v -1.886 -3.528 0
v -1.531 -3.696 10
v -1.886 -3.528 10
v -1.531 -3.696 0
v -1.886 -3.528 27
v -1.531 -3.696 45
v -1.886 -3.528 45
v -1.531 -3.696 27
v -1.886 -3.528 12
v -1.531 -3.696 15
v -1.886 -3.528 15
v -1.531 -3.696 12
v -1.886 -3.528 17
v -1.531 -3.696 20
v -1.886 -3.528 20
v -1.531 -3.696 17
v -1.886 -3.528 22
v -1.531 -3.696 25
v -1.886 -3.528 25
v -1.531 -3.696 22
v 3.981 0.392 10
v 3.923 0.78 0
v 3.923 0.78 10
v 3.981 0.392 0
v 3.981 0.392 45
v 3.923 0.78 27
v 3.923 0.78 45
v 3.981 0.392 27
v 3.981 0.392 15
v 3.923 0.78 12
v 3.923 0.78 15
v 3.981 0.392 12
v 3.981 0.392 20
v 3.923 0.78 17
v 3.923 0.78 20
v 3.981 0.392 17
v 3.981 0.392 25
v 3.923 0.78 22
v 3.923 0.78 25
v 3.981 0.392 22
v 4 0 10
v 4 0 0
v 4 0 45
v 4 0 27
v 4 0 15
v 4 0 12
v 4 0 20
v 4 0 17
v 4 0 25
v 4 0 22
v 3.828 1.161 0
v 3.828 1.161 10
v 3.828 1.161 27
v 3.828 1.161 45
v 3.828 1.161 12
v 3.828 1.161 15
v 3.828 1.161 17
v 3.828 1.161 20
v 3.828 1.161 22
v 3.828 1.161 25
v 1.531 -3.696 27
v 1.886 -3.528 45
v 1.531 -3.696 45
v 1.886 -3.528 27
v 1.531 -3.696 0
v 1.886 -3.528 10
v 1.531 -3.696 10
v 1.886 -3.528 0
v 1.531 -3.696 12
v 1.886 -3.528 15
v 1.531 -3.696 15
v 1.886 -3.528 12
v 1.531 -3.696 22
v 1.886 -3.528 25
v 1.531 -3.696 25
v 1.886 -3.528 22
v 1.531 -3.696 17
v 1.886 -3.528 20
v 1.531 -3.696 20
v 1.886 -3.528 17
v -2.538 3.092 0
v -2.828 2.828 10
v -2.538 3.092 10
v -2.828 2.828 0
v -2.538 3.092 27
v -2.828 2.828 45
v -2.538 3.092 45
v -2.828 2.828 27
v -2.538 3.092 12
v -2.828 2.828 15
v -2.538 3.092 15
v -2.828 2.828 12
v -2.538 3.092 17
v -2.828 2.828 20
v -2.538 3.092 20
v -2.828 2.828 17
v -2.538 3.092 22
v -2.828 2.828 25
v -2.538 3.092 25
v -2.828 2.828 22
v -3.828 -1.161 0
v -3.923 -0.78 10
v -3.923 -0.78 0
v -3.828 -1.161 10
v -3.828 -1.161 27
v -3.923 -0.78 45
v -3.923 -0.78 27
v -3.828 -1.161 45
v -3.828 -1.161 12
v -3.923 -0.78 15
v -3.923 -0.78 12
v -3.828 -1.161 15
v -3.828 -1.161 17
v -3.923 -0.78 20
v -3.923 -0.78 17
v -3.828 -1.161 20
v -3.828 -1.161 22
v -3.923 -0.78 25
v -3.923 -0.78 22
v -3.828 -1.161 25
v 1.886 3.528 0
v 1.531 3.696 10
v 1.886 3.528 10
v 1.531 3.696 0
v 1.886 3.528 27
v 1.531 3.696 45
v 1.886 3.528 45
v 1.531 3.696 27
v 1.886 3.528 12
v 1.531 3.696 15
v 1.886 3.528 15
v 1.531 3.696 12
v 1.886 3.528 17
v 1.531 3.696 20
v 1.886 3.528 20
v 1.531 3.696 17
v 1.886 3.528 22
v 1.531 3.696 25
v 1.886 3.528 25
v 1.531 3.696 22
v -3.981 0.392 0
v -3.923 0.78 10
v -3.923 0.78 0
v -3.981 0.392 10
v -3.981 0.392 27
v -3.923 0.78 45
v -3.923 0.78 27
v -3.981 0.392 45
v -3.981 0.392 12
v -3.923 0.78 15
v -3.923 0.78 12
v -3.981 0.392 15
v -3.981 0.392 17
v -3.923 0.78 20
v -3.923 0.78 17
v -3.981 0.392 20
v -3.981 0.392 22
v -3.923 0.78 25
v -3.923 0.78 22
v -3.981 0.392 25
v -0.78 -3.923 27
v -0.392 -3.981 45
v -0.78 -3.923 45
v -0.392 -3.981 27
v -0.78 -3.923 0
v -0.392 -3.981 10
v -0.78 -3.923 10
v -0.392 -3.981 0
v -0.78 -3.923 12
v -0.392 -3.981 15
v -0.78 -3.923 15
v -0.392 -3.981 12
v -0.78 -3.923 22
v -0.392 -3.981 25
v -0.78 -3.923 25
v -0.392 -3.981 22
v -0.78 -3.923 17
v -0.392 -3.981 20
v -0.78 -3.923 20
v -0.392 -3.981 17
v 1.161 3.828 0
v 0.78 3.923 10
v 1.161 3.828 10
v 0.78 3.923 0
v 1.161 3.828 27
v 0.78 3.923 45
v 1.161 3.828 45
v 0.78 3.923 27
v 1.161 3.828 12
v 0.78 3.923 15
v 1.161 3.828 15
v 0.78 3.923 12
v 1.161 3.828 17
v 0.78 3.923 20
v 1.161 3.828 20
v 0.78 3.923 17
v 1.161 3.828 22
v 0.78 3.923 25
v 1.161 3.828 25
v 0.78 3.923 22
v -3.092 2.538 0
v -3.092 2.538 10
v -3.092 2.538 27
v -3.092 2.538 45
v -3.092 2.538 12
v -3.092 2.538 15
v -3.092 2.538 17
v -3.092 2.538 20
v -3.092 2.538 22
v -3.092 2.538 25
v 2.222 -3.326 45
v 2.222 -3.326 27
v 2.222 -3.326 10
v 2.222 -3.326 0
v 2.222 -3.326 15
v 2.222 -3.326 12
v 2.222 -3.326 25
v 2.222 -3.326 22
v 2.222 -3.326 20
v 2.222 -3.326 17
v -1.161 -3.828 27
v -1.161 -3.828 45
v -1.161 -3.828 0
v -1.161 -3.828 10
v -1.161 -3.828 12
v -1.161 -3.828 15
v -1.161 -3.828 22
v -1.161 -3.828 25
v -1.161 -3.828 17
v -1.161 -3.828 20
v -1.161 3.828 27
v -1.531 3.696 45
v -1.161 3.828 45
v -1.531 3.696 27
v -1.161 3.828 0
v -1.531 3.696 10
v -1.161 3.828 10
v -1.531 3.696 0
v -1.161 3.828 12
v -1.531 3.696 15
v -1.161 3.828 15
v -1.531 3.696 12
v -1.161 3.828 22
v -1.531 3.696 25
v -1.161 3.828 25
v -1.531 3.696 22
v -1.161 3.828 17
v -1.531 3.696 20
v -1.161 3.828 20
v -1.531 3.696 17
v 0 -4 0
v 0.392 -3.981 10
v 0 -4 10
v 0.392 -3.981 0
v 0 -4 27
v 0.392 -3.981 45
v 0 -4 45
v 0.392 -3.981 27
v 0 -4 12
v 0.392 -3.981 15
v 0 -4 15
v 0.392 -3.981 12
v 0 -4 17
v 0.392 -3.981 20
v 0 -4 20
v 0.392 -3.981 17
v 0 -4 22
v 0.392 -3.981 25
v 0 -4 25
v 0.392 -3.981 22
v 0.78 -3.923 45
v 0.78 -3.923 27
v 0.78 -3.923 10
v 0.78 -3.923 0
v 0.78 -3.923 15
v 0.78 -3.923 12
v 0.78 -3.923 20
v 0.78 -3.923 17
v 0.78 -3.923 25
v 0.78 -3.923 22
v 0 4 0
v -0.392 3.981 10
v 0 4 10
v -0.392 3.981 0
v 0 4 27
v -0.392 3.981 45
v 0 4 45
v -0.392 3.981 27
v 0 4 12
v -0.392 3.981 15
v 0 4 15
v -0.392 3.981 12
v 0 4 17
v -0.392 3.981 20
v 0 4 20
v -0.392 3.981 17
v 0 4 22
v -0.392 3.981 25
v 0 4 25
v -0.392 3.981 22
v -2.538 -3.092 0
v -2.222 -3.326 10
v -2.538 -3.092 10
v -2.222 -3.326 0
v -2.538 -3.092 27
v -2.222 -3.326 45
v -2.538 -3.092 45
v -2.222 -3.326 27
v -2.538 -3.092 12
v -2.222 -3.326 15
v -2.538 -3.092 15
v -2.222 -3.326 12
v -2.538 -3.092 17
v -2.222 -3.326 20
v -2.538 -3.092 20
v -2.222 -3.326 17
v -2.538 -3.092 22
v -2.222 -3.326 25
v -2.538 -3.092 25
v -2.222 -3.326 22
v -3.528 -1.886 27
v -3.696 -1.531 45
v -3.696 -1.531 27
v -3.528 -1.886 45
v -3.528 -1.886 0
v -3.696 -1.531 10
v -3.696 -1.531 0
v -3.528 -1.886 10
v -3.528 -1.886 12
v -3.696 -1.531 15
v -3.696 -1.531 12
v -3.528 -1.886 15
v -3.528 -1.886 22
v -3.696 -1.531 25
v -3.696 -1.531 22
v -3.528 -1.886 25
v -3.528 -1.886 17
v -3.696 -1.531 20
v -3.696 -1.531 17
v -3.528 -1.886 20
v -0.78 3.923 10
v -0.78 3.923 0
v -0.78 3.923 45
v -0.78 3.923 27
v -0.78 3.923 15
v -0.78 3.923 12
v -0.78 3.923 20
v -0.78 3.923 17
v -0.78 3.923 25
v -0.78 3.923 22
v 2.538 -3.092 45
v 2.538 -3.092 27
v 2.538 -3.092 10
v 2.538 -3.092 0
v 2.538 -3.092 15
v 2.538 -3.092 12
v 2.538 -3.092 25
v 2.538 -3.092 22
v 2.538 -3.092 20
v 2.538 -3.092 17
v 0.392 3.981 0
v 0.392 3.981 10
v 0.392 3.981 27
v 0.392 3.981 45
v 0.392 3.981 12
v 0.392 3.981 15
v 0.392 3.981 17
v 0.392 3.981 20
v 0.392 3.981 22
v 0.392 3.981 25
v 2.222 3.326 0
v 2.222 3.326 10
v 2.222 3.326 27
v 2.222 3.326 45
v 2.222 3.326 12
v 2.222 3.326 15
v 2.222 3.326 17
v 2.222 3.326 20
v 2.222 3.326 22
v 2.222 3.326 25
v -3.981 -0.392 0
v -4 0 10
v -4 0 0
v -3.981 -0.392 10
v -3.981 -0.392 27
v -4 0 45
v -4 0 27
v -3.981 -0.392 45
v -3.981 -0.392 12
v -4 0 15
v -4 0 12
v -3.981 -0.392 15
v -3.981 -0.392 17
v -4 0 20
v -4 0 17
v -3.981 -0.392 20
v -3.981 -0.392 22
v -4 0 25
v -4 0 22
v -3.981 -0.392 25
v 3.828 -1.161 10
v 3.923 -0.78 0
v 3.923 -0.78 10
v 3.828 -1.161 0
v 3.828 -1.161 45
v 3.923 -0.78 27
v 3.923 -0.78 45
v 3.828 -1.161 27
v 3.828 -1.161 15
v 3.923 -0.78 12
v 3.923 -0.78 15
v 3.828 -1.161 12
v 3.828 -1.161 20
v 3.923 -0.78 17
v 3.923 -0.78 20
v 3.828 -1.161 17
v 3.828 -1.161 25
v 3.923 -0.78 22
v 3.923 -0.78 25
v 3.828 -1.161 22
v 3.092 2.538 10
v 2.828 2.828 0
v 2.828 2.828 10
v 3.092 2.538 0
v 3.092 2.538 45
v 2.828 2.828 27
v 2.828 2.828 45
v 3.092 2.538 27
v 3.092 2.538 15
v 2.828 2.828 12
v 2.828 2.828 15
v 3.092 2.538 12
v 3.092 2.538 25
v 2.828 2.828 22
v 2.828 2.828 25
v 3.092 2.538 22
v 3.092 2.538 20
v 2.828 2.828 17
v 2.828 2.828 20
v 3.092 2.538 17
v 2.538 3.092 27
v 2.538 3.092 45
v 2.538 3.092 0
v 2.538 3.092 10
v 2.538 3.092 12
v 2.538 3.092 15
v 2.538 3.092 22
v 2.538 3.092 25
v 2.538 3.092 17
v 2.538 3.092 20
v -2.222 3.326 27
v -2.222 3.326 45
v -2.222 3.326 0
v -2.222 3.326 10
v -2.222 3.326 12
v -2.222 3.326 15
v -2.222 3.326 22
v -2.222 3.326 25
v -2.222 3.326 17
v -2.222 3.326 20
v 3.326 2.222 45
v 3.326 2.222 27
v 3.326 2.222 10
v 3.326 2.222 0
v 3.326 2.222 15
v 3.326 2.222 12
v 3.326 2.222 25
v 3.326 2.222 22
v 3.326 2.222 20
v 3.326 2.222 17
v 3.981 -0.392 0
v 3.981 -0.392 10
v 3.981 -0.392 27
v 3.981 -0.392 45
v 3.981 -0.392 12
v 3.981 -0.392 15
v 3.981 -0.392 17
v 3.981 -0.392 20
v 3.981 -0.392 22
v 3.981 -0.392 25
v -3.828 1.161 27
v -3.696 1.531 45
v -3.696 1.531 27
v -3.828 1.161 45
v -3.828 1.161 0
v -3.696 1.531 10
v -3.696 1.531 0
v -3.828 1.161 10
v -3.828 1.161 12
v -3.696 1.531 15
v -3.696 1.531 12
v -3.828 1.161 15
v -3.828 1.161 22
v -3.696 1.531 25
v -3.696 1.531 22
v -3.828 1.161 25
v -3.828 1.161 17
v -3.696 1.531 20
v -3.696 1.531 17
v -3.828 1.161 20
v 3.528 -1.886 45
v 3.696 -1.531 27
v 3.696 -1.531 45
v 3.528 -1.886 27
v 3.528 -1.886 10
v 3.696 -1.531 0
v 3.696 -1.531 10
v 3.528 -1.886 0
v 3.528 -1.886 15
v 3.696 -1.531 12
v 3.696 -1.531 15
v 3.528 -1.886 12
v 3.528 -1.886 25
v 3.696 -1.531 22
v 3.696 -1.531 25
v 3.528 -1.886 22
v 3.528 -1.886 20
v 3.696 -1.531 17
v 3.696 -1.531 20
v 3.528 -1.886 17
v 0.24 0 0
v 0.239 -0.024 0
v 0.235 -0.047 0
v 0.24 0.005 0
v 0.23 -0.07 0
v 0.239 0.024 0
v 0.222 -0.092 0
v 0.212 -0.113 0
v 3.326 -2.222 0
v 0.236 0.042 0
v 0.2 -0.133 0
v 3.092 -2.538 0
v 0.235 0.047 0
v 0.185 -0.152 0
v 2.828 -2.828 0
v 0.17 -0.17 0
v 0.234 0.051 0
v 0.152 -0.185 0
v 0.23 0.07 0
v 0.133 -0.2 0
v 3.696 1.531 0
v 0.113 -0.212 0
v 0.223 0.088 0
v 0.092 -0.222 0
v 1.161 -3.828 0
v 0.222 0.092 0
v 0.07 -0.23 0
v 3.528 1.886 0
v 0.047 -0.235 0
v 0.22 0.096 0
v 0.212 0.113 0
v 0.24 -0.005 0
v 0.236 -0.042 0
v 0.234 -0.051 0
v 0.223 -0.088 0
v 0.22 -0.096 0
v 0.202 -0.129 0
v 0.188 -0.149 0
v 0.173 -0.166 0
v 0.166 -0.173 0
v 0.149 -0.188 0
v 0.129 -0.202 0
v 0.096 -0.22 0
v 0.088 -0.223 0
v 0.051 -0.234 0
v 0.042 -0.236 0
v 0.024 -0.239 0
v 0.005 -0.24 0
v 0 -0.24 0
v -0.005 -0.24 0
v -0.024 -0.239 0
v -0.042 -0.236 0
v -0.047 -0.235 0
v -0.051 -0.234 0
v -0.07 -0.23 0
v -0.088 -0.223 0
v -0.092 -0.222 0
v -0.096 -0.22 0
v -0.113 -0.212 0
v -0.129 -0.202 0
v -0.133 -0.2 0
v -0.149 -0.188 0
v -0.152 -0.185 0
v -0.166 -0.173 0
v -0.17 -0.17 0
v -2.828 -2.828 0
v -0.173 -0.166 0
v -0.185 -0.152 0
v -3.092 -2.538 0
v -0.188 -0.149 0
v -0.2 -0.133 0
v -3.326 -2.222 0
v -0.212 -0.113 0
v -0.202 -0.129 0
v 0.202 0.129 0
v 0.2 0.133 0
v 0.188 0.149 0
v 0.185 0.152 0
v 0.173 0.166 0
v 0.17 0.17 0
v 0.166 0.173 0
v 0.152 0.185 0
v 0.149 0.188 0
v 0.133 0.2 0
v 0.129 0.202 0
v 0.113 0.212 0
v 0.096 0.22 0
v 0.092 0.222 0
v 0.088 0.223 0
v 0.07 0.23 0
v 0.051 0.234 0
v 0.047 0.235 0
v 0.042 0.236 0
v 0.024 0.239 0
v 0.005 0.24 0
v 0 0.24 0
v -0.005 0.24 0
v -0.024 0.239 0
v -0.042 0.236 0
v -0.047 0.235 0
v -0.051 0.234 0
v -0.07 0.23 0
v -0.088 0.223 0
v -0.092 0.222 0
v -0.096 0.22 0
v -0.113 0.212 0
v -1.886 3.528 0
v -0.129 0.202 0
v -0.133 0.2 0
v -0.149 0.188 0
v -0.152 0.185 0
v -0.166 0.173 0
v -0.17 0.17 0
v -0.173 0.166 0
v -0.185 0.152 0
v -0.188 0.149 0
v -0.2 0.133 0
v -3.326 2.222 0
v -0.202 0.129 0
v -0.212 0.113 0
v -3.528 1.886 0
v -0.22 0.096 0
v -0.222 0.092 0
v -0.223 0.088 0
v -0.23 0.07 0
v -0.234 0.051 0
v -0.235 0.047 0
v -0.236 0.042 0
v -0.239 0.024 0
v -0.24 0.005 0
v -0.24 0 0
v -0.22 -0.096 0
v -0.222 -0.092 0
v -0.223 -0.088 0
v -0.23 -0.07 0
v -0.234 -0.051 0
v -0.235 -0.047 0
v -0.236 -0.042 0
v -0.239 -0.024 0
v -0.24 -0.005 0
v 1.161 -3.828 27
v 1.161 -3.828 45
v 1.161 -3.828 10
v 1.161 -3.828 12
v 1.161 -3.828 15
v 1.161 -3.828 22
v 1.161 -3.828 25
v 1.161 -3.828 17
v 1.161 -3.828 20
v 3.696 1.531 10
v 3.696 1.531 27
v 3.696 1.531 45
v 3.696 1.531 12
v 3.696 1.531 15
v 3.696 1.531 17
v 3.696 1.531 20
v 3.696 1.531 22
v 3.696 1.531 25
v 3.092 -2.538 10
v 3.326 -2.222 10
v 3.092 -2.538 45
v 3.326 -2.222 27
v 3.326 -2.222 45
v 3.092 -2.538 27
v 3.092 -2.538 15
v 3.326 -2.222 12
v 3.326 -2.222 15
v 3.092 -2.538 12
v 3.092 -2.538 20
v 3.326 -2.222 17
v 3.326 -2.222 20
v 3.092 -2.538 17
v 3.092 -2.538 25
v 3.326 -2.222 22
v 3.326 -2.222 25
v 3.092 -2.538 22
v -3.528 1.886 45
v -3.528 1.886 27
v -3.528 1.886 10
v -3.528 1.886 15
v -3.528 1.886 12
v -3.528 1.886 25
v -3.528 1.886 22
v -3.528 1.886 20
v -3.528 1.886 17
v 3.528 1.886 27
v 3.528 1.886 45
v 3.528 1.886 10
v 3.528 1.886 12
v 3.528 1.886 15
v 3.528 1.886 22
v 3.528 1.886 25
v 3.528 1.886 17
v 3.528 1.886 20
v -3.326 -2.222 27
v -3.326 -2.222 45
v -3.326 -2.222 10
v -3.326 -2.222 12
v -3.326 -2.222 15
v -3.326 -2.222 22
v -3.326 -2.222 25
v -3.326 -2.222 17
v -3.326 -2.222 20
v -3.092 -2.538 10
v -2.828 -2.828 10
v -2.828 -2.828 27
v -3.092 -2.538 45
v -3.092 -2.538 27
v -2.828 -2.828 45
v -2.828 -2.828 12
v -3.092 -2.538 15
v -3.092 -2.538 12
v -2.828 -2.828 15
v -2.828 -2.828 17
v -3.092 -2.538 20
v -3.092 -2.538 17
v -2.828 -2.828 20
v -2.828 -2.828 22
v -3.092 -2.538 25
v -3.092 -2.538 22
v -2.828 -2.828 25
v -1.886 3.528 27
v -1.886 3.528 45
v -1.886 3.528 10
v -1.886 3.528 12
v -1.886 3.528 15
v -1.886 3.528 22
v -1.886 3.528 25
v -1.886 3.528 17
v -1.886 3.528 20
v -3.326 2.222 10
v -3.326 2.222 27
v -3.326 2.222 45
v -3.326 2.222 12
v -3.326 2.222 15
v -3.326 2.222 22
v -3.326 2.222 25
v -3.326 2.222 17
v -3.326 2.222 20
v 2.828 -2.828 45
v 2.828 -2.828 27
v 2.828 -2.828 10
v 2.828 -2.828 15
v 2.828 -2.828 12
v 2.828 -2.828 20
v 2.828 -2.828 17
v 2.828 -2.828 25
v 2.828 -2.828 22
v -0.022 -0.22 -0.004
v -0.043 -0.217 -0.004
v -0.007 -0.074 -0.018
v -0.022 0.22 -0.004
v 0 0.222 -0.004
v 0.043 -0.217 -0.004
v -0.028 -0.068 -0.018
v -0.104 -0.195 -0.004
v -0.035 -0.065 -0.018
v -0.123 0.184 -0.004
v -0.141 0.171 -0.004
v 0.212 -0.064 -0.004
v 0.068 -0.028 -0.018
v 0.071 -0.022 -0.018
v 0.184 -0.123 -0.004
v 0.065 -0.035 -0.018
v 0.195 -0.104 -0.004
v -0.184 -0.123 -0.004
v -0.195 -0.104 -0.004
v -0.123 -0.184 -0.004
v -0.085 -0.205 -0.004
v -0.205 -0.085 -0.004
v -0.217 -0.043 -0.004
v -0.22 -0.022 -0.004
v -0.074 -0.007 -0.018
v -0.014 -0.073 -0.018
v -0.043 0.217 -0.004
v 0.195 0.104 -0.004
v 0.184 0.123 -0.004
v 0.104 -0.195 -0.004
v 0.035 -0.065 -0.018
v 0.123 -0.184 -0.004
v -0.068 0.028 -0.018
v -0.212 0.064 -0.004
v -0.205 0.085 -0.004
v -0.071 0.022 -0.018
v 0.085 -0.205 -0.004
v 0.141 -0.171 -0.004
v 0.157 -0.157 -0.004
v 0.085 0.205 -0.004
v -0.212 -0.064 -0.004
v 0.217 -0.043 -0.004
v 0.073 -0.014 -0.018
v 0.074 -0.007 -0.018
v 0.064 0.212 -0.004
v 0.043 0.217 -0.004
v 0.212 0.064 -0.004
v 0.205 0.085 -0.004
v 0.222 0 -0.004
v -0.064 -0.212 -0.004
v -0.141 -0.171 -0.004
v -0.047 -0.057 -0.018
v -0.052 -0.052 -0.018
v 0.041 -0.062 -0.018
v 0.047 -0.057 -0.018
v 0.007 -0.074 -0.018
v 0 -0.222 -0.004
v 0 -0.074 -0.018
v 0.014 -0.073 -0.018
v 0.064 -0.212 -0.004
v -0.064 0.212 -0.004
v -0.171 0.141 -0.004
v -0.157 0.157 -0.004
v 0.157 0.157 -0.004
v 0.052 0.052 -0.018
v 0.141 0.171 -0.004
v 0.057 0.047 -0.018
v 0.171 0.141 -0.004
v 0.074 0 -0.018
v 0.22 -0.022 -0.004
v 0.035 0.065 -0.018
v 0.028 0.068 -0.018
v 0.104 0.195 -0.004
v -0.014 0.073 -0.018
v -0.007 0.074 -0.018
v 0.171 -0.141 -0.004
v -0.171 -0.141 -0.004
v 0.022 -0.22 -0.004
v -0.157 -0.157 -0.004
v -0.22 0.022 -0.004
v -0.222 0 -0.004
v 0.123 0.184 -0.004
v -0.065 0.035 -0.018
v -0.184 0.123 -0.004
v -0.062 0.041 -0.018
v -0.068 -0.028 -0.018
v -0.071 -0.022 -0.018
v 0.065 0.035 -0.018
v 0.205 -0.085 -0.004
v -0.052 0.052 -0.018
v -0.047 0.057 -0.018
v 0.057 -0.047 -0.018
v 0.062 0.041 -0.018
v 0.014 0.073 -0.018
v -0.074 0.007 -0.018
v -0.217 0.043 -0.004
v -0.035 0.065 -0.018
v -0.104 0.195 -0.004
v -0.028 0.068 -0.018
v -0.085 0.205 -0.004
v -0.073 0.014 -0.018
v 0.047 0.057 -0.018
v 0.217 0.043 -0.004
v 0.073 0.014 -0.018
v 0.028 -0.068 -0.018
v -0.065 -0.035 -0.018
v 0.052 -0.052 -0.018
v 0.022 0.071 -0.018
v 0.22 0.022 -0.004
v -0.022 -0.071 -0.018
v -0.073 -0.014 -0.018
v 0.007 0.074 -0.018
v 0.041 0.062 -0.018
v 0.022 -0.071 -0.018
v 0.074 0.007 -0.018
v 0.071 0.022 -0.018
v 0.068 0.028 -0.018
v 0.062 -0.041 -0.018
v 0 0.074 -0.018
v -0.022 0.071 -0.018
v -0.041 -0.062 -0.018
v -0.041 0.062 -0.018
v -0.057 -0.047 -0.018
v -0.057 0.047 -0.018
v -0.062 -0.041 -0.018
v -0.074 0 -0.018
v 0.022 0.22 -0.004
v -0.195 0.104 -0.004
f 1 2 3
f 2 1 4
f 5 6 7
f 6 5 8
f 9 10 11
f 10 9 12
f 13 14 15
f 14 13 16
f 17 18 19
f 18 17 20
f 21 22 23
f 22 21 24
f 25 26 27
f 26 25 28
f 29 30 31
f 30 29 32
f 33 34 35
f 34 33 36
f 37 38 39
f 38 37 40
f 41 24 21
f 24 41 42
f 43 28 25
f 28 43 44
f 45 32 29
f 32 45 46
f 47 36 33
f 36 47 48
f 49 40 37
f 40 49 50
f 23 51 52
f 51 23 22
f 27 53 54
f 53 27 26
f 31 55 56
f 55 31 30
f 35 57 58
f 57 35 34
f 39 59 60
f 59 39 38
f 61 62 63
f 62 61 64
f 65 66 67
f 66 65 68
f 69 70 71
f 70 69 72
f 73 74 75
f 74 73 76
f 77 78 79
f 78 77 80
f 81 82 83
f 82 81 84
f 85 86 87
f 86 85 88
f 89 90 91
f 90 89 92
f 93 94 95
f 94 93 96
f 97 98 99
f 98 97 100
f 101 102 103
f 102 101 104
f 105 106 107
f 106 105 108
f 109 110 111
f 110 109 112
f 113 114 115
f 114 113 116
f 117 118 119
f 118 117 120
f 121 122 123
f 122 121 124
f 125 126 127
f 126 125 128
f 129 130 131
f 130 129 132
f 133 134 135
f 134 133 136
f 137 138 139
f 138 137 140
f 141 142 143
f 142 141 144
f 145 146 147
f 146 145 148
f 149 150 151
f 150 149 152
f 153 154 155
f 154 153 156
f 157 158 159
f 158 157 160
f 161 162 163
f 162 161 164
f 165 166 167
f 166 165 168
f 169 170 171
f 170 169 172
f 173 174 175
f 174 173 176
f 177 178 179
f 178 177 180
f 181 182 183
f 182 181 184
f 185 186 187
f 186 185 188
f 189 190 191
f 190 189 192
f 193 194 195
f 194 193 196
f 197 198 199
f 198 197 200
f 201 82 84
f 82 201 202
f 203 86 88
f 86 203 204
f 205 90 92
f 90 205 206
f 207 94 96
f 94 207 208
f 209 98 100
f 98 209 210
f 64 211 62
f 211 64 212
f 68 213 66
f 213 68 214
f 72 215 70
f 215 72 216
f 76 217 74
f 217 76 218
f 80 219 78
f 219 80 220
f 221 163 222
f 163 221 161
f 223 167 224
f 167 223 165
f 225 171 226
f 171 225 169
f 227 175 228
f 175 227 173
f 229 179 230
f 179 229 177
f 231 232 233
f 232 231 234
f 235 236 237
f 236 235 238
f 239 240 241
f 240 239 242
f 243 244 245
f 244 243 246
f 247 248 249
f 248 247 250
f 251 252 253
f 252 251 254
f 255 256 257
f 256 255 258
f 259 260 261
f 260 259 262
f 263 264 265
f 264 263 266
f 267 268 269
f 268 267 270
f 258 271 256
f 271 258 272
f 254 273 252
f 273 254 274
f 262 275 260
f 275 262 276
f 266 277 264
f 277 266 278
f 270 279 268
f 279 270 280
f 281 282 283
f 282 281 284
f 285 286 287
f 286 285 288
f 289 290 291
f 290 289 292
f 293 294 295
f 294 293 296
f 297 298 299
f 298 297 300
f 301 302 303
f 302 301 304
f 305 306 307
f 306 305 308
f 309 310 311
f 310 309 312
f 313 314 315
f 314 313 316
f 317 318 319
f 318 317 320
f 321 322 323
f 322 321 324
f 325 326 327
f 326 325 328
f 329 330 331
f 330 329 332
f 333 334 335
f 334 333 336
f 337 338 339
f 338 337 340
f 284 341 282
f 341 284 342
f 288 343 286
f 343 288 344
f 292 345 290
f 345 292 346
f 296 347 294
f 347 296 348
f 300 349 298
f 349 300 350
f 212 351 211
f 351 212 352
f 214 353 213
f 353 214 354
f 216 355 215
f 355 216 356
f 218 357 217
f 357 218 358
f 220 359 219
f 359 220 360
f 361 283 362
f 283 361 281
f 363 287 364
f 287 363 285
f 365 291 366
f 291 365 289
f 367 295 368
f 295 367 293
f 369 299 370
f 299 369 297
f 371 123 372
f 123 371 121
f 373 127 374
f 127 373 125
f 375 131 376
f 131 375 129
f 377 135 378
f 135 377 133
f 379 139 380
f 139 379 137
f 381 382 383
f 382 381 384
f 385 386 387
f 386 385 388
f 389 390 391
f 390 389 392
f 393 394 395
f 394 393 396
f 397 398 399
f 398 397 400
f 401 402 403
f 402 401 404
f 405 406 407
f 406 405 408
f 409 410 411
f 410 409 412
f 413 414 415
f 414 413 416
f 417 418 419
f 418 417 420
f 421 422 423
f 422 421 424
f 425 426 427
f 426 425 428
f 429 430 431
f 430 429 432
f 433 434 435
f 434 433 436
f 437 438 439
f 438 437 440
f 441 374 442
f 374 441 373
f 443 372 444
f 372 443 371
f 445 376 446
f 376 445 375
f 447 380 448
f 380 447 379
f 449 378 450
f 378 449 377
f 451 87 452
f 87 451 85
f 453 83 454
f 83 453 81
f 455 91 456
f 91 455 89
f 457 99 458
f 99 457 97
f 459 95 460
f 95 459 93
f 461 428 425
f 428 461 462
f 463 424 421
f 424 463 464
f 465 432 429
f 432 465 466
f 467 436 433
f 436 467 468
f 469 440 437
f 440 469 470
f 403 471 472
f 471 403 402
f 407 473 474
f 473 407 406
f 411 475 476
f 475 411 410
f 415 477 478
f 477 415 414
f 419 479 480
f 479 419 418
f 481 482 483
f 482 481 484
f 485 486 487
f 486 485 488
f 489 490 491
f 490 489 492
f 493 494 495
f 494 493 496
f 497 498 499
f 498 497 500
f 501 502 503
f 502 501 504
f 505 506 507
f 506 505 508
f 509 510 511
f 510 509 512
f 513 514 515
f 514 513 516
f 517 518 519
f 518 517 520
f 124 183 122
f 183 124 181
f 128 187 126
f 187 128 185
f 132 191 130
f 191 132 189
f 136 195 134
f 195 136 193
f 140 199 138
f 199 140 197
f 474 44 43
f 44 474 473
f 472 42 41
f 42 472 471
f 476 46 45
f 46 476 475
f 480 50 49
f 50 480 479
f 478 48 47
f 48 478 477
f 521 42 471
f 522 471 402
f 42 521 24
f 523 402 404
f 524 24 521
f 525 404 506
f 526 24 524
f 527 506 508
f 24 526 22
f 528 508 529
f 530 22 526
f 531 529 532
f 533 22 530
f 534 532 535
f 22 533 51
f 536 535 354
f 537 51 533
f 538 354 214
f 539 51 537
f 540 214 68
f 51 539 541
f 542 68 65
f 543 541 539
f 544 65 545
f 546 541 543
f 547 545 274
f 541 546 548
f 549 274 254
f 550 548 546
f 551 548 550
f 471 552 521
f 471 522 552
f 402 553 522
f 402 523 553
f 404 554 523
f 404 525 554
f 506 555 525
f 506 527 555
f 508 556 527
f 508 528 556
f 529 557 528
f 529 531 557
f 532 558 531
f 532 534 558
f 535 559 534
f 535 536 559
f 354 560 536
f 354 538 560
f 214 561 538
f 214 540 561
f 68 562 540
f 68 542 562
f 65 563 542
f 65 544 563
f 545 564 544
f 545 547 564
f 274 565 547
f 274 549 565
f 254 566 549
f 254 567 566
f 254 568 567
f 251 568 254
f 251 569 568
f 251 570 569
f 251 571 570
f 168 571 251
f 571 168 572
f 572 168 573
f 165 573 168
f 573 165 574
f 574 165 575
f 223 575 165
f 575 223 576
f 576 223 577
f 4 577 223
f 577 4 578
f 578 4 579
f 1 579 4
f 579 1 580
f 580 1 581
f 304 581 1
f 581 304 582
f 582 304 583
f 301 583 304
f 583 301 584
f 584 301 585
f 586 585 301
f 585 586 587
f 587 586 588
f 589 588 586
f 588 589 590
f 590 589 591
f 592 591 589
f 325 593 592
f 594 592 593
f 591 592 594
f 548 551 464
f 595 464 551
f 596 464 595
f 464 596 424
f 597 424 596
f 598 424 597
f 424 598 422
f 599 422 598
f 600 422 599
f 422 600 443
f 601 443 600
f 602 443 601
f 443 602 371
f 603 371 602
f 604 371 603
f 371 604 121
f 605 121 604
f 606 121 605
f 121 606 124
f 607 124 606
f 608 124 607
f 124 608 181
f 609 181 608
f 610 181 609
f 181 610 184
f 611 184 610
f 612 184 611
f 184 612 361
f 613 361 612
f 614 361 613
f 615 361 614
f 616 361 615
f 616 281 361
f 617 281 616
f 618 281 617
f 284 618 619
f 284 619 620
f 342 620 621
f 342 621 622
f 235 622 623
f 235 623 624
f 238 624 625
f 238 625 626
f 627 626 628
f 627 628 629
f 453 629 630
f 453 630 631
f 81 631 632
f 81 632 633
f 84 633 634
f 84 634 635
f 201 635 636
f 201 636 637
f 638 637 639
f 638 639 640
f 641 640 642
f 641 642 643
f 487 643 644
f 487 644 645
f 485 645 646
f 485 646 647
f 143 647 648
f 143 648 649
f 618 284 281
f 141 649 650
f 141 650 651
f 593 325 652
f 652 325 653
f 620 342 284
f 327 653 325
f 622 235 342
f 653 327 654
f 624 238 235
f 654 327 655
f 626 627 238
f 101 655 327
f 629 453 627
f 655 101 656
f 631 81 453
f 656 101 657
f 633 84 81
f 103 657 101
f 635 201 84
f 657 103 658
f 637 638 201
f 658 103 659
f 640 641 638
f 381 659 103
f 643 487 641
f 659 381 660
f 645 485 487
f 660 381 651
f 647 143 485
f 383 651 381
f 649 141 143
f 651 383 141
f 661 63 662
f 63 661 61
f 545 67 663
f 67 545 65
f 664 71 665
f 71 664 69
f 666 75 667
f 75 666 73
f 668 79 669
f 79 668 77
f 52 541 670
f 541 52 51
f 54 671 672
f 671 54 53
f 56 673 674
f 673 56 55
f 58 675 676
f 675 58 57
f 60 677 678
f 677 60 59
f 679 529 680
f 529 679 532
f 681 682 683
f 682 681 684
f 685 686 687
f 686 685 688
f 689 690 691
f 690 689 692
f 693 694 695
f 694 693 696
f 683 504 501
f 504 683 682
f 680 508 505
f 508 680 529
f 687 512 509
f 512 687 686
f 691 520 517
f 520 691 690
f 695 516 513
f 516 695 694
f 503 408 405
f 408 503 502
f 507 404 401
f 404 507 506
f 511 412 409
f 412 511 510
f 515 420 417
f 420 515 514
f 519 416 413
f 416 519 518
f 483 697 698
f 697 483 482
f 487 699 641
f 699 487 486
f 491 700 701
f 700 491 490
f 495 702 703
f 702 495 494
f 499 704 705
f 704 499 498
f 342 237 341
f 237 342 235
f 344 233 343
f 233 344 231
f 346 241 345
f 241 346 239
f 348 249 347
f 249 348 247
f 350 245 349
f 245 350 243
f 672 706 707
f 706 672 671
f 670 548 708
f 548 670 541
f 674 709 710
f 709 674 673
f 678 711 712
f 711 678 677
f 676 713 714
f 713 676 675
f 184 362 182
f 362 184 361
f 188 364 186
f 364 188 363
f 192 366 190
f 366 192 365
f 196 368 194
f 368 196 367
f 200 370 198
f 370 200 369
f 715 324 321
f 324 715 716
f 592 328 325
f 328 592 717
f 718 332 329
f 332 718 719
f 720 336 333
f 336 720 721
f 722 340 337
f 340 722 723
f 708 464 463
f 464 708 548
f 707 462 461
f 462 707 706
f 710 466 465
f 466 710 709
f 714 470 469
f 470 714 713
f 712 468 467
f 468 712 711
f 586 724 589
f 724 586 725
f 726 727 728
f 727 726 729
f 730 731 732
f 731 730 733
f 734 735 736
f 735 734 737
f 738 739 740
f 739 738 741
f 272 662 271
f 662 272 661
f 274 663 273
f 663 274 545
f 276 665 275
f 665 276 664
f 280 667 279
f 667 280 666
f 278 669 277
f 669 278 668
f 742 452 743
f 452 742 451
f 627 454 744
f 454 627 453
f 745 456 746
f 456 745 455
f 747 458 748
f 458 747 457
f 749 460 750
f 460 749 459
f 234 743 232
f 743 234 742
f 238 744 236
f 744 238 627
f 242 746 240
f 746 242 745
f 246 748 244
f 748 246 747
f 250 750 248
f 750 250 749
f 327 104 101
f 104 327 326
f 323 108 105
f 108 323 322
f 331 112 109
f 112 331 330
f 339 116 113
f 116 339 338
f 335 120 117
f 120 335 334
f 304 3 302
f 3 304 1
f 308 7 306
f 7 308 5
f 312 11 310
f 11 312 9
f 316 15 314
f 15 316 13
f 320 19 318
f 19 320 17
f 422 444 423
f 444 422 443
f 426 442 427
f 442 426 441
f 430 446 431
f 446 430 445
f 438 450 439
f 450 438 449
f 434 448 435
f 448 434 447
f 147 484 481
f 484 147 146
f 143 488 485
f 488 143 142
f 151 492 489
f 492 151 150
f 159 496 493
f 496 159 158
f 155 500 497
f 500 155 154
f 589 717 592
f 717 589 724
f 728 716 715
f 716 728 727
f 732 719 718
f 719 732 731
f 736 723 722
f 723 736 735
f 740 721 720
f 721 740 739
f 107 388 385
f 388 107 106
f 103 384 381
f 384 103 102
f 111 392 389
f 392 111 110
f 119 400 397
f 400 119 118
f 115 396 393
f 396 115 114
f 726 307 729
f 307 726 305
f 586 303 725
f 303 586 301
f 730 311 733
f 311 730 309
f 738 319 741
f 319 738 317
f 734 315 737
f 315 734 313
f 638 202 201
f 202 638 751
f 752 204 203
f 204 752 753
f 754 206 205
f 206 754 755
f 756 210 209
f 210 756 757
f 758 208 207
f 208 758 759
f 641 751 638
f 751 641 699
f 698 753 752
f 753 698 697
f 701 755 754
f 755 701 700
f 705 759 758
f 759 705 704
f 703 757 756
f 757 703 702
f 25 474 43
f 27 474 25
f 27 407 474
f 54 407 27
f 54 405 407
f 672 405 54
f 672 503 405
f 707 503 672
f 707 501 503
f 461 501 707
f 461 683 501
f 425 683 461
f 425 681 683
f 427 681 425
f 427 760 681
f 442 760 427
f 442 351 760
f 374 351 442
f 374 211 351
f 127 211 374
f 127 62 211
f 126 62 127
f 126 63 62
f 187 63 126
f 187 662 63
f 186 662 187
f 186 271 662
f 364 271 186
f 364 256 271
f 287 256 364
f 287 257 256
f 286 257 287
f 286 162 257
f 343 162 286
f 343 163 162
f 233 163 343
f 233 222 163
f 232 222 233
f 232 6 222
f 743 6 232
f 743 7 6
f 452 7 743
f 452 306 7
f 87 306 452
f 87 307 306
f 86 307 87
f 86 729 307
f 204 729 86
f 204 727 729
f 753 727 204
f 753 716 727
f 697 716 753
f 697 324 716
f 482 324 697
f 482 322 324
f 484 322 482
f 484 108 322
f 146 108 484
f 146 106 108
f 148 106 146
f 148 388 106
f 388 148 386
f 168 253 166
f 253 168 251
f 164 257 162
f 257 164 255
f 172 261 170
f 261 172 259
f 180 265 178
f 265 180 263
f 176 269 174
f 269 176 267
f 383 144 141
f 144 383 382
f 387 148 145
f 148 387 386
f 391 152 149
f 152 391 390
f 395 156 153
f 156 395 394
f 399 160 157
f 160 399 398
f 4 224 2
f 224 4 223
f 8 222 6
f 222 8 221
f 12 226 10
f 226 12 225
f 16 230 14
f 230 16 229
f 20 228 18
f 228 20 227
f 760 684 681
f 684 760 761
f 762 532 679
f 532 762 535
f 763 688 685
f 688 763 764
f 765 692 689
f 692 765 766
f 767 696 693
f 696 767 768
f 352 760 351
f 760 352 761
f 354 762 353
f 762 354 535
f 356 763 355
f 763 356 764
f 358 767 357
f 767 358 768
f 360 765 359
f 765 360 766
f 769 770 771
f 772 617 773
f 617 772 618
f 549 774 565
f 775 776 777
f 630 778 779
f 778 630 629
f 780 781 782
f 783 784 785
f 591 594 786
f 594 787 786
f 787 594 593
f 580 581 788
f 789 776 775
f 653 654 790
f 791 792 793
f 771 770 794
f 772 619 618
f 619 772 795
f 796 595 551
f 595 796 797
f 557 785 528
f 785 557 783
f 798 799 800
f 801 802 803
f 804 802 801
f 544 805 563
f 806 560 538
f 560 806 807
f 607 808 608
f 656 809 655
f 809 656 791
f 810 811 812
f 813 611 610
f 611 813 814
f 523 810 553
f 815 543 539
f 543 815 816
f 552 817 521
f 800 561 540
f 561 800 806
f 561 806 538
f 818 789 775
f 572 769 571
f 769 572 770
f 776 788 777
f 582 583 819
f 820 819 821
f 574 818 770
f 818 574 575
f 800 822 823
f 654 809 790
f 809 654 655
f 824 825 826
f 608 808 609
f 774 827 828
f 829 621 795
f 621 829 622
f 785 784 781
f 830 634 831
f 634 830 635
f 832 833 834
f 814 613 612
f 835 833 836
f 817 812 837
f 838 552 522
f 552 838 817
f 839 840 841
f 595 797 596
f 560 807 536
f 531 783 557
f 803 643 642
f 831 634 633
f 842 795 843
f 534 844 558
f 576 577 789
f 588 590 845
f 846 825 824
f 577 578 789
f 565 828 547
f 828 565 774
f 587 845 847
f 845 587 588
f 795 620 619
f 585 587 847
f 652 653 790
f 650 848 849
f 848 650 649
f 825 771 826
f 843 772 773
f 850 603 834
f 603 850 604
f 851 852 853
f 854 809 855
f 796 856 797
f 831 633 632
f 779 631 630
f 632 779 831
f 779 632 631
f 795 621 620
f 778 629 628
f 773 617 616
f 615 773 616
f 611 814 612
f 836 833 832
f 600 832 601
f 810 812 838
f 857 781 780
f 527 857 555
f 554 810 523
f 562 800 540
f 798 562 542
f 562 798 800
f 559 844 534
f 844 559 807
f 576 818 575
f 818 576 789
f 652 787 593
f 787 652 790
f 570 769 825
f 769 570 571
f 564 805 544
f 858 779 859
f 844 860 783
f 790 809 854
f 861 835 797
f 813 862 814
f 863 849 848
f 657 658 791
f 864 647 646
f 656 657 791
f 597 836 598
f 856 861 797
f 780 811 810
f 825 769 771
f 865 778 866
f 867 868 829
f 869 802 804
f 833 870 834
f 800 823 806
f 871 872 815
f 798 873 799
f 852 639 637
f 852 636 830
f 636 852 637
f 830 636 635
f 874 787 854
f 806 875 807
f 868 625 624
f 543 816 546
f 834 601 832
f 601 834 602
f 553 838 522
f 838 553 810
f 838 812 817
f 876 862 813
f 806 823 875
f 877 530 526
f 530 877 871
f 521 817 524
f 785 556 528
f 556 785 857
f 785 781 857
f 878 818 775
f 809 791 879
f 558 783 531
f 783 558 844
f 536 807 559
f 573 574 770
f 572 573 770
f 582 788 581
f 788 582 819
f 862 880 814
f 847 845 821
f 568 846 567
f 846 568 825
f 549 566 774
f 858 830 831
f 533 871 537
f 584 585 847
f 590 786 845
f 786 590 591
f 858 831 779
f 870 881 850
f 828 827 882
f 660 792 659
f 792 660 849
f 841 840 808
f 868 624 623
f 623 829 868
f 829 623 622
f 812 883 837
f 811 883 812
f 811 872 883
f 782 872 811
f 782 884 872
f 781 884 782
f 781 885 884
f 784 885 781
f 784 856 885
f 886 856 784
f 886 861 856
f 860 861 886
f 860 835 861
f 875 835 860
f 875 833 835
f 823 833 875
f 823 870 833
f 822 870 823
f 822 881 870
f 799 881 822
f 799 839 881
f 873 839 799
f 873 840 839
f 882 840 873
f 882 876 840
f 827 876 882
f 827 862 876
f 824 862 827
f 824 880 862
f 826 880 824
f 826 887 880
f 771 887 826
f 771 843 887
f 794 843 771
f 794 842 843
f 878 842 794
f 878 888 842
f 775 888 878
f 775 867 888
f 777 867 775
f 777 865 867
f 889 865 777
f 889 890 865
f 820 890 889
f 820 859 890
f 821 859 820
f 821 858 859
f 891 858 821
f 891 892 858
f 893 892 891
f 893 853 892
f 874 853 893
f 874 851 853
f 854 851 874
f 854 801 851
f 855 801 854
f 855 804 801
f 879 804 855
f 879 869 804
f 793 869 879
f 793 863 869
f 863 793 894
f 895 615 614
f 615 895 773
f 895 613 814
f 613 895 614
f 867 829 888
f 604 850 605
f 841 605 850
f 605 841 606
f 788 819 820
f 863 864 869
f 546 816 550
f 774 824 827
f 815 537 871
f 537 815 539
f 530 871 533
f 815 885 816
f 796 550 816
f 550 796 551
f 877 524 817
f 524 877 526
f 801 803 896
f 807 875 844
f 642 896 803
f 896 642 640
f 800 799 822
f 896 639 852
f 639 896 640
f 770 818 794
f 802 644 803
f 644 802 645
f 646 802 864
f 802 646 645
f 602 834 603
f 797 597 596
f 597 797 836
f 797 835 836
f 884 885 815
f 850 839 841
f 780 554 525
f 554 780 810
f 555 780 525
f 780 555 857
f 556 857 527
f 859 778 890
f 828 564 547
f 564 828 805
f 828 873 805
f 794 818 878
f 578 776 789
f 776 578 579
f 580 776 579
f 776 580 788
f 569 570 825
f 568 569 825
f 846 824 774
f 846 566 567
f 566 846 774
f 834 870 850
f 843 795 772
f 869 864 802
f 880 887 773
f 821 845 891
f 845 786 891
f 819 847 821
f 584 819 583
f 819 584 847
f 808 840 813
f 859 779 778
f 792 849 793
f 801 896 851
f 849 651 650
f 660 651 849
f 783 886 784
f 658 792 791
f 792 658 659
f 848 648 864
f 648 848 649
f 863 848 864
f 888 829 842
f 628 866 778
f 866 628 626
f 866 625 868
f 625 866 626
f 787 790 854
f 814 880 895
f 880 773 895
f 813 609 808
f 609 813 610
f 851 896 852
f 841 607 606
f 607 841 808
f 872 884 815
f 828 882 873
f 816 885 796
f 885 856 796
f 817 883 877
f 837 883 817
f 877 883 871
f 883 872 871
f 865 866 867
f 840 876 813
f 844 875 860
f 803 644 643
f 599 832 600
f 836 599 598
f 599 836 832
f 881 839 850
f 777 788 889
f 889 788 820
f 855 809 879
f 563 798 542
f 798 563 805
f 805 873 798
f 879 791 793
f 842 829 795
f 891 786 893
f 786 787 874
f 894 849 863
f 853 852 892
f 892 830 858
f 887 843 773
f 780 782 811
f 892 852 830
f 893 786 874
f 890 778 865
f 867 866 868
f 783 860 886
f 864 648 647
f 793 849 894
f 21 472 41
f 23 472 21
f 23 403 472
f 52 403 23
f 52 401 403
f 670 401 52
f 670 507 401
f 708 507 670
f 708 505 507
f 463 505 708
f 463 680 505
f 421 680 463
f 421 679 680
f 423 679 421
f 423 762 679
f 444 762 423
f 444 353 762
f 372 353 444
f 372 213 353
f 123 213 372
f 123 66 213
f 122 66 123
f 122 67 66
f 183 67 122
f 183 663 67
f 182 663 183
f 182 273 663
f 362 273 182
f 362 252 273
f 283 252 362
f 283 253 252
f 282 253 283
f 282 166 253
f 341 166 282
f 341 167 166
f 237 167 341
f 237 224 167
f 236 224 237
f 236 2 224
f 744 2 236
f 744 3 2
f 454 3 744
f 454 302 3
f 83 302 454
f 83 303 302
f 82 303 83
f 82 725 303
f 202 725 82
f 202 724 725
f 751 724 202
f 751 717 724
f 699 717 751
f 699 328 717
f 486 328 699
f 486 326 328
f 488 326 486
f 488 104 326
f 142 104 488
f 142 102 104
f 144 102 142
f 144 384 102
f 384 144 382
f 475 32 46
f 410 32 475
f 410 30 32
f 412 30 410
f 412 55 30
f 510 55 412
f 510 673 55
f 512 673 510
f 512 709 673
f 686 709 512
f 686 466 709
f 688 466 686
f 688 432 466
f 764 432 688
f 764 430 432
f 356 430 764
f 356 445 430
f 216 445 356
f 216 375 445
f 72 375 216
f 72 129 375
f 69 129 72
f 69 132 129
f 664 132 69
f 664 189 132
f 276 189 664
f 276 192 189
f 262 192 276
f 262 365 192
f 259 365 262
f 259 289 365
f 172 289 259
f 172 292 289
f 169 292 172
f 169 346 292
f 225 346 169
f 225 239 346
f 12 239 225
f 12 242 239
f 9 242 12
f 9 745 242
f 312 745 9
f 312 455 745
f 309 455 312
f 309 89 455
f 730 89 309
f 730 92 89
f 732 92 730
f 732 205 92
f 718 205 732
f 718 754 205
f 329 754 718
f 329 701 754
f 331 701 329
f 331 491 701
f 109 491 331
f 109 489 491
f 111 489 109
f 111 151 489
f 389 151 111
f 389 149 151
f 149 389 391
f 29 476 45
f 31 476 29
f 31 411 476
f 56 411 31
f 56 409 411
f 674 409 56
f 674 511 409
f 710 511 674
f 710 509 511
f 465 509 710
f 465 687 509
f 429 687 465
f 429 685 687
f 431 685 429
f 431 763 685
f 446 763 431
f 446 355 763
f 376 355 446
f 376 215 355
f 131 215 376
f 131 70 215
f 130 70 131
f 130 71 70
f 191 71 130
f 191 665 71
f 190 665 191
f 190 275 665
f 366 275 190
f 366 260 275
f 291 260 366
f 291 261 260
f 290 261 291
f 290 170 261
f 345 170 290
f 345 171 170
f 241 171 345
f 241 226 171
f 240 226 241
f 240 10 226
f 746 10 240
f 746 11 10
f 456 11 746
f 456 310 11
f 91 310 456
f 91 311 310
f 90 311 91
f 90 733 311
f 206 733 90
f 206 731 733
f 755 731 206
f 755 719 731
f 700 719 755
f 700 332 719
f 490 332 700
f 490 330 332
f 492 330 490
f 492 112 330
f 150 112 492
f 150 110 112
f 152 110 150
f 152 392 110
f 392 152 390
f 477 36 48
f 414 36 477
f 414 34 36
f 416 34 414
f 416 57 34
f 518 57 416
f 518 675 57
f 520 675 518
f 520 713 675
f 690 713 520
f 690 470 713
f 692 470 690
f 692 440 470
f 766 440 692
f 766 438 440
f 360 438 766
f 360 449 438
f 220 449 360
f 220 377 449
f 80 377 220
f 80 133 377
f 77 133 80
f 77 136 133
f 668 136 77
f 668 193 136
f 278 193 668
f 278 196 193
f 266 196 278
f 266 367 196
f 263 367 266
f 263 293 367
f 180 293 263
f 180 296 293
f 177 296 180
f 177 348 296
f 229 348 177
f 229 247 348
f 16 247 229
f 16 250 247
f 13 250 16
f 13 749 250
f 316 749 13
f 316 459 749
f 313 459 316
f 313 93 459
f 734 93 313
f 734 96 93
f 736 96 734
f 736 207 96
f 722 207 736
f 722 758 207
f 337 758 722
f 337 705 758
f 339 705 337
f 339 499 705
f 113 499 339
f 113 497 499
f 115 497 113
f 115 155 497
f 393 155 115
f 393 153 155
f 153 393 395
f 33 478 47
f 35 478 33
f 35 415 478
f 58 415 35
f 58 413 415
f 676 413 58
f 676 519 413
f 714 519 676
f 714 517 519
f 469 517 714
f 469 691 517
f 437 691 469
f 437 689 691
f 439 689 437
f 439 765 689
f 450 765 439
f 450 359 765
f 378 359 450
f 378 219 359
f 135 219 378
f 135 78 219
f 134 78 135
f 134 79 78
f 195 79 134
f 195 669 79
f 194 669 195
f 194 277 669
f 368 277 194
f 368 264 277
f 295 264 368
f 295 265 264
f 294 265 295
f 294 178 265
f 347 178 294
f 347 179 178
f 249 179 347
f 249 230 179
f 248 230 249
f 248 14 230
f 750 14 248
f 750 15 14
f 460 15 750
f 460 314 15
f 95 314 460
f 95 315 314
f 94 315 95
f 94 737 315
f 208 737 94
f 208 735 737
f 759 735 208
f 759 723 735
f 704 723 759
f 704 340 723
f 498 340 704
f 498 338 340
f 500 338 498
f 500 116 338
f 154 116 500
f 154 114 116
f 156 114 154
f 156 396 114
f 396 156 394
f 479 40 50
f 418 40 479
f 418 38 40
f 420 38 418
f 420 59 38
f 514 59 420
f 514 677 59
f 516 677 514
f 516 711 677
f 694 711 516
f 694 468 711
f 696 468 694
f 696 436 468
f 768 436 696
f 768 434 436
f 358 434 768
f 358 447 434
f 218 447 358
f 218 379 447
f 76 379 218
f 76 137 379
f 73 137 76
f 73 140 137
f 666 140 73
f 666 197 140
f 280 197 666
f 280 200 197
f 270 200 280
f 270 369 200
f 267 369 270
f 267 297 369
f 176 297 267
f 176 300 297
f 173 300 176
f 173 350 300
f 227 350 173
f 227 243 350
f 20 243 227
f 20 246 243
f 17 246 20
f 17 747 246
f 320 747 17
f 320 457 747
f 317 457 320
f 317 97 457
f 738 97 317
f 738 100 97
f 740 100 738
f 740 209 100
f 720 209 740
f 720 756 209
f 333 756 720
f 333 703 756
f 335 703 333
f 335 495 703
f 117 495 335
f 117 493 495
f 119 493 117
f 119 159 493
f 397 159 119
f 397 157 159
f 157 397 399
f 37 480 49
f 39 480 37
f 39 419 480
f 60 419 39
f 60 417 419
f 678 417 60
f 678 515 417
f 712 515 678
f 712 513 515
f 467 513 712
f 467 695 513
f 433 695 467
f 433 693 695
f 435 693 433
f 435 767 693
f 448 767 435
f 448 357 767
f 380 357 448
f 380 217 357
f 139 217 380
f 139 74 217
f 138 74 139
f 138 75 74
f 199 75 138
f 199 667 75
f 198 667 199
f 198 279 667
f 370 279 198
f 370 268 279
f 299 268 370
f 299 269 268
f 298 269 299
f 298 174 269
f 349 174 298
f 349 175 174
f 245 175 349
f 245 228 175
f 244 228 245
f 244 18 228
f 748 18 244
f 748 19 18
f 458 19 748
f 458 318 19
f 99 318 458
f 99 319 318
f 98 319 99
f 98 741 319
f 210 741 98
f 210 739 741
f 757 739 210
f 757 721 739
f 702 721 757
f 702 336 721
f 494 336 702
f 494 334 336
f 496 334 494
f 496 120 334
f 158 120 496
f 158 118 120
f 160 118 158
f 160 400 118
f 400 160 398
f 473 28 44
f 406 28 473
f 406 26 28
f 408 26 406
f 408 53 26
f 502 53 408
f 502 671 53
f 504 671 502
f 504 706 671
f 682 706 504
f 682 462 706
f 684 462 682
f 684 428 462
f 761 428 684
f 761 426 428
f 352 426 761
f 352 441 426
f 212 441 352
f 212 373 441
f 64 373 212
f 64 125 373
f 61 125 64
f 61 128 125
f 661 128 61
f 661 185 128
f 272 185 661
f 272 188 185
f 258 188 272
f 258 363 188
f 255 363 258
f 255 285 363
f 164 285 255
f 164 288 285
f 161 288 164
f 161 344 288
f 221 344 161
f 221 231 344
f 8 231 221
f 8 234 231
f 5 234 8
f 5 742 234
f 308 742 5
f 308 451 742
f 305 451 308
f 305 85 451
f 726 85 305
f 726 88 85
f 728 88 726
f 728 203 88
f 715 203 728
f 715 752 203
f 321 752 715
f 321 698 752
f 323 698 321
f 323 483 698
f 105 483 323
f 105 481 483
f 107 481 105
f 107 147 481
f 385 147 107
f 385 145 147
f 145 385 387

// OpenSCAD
// Tissue-pestle for 1.5 mL microcentrifuge tube
// Print orientation: handle down on the bed (z = 0), tip up (+Z)

$fn = 64;

// ---- Dimensions (mm) ----
handle_d      = 8;    // handle diameter
handle_h      = 45;   // handle height (z = 0 to 45)
cone_d_bottom = 8;    // cone diameter at z = 45
cone_d_top    = 3;    // cone diameter at z = 62
tip_d         = 3;    // sphere diameter (centred at z = 62)
groove_w      = 2;    // circumferential groove width (Z)
groove_depth  = 1;    // groove depth into handle
groove_z      = [10, 15, 20, 25]; // groove centre heights

eps = 0.5;            // overshoot for clean boolean cuts

// ---- Model ----
difference() {
    union() {
        // Handle
        cylinder(d = handle_d, h = handle_h);
        // Cone (slightly overlaps handle for a solid union)
        translate([0, 0, handle_h - 0.01])
            cylinder(d1 = cone_d_bottom, d2 = cone_d_top, h = cone_d_top - cone_d_bottom + 0.01);
        // Tip sphere
        translate([0, 0, tip_d / 2 - 0.01])
            sphere(d = tip_d + 0.02);
    }
    // Grip grooves
    for (z = groove_z)
        translate([0, 0, z])
            cylinder(d = handle_d, h = groove_w, depth = groove_depth);
}
